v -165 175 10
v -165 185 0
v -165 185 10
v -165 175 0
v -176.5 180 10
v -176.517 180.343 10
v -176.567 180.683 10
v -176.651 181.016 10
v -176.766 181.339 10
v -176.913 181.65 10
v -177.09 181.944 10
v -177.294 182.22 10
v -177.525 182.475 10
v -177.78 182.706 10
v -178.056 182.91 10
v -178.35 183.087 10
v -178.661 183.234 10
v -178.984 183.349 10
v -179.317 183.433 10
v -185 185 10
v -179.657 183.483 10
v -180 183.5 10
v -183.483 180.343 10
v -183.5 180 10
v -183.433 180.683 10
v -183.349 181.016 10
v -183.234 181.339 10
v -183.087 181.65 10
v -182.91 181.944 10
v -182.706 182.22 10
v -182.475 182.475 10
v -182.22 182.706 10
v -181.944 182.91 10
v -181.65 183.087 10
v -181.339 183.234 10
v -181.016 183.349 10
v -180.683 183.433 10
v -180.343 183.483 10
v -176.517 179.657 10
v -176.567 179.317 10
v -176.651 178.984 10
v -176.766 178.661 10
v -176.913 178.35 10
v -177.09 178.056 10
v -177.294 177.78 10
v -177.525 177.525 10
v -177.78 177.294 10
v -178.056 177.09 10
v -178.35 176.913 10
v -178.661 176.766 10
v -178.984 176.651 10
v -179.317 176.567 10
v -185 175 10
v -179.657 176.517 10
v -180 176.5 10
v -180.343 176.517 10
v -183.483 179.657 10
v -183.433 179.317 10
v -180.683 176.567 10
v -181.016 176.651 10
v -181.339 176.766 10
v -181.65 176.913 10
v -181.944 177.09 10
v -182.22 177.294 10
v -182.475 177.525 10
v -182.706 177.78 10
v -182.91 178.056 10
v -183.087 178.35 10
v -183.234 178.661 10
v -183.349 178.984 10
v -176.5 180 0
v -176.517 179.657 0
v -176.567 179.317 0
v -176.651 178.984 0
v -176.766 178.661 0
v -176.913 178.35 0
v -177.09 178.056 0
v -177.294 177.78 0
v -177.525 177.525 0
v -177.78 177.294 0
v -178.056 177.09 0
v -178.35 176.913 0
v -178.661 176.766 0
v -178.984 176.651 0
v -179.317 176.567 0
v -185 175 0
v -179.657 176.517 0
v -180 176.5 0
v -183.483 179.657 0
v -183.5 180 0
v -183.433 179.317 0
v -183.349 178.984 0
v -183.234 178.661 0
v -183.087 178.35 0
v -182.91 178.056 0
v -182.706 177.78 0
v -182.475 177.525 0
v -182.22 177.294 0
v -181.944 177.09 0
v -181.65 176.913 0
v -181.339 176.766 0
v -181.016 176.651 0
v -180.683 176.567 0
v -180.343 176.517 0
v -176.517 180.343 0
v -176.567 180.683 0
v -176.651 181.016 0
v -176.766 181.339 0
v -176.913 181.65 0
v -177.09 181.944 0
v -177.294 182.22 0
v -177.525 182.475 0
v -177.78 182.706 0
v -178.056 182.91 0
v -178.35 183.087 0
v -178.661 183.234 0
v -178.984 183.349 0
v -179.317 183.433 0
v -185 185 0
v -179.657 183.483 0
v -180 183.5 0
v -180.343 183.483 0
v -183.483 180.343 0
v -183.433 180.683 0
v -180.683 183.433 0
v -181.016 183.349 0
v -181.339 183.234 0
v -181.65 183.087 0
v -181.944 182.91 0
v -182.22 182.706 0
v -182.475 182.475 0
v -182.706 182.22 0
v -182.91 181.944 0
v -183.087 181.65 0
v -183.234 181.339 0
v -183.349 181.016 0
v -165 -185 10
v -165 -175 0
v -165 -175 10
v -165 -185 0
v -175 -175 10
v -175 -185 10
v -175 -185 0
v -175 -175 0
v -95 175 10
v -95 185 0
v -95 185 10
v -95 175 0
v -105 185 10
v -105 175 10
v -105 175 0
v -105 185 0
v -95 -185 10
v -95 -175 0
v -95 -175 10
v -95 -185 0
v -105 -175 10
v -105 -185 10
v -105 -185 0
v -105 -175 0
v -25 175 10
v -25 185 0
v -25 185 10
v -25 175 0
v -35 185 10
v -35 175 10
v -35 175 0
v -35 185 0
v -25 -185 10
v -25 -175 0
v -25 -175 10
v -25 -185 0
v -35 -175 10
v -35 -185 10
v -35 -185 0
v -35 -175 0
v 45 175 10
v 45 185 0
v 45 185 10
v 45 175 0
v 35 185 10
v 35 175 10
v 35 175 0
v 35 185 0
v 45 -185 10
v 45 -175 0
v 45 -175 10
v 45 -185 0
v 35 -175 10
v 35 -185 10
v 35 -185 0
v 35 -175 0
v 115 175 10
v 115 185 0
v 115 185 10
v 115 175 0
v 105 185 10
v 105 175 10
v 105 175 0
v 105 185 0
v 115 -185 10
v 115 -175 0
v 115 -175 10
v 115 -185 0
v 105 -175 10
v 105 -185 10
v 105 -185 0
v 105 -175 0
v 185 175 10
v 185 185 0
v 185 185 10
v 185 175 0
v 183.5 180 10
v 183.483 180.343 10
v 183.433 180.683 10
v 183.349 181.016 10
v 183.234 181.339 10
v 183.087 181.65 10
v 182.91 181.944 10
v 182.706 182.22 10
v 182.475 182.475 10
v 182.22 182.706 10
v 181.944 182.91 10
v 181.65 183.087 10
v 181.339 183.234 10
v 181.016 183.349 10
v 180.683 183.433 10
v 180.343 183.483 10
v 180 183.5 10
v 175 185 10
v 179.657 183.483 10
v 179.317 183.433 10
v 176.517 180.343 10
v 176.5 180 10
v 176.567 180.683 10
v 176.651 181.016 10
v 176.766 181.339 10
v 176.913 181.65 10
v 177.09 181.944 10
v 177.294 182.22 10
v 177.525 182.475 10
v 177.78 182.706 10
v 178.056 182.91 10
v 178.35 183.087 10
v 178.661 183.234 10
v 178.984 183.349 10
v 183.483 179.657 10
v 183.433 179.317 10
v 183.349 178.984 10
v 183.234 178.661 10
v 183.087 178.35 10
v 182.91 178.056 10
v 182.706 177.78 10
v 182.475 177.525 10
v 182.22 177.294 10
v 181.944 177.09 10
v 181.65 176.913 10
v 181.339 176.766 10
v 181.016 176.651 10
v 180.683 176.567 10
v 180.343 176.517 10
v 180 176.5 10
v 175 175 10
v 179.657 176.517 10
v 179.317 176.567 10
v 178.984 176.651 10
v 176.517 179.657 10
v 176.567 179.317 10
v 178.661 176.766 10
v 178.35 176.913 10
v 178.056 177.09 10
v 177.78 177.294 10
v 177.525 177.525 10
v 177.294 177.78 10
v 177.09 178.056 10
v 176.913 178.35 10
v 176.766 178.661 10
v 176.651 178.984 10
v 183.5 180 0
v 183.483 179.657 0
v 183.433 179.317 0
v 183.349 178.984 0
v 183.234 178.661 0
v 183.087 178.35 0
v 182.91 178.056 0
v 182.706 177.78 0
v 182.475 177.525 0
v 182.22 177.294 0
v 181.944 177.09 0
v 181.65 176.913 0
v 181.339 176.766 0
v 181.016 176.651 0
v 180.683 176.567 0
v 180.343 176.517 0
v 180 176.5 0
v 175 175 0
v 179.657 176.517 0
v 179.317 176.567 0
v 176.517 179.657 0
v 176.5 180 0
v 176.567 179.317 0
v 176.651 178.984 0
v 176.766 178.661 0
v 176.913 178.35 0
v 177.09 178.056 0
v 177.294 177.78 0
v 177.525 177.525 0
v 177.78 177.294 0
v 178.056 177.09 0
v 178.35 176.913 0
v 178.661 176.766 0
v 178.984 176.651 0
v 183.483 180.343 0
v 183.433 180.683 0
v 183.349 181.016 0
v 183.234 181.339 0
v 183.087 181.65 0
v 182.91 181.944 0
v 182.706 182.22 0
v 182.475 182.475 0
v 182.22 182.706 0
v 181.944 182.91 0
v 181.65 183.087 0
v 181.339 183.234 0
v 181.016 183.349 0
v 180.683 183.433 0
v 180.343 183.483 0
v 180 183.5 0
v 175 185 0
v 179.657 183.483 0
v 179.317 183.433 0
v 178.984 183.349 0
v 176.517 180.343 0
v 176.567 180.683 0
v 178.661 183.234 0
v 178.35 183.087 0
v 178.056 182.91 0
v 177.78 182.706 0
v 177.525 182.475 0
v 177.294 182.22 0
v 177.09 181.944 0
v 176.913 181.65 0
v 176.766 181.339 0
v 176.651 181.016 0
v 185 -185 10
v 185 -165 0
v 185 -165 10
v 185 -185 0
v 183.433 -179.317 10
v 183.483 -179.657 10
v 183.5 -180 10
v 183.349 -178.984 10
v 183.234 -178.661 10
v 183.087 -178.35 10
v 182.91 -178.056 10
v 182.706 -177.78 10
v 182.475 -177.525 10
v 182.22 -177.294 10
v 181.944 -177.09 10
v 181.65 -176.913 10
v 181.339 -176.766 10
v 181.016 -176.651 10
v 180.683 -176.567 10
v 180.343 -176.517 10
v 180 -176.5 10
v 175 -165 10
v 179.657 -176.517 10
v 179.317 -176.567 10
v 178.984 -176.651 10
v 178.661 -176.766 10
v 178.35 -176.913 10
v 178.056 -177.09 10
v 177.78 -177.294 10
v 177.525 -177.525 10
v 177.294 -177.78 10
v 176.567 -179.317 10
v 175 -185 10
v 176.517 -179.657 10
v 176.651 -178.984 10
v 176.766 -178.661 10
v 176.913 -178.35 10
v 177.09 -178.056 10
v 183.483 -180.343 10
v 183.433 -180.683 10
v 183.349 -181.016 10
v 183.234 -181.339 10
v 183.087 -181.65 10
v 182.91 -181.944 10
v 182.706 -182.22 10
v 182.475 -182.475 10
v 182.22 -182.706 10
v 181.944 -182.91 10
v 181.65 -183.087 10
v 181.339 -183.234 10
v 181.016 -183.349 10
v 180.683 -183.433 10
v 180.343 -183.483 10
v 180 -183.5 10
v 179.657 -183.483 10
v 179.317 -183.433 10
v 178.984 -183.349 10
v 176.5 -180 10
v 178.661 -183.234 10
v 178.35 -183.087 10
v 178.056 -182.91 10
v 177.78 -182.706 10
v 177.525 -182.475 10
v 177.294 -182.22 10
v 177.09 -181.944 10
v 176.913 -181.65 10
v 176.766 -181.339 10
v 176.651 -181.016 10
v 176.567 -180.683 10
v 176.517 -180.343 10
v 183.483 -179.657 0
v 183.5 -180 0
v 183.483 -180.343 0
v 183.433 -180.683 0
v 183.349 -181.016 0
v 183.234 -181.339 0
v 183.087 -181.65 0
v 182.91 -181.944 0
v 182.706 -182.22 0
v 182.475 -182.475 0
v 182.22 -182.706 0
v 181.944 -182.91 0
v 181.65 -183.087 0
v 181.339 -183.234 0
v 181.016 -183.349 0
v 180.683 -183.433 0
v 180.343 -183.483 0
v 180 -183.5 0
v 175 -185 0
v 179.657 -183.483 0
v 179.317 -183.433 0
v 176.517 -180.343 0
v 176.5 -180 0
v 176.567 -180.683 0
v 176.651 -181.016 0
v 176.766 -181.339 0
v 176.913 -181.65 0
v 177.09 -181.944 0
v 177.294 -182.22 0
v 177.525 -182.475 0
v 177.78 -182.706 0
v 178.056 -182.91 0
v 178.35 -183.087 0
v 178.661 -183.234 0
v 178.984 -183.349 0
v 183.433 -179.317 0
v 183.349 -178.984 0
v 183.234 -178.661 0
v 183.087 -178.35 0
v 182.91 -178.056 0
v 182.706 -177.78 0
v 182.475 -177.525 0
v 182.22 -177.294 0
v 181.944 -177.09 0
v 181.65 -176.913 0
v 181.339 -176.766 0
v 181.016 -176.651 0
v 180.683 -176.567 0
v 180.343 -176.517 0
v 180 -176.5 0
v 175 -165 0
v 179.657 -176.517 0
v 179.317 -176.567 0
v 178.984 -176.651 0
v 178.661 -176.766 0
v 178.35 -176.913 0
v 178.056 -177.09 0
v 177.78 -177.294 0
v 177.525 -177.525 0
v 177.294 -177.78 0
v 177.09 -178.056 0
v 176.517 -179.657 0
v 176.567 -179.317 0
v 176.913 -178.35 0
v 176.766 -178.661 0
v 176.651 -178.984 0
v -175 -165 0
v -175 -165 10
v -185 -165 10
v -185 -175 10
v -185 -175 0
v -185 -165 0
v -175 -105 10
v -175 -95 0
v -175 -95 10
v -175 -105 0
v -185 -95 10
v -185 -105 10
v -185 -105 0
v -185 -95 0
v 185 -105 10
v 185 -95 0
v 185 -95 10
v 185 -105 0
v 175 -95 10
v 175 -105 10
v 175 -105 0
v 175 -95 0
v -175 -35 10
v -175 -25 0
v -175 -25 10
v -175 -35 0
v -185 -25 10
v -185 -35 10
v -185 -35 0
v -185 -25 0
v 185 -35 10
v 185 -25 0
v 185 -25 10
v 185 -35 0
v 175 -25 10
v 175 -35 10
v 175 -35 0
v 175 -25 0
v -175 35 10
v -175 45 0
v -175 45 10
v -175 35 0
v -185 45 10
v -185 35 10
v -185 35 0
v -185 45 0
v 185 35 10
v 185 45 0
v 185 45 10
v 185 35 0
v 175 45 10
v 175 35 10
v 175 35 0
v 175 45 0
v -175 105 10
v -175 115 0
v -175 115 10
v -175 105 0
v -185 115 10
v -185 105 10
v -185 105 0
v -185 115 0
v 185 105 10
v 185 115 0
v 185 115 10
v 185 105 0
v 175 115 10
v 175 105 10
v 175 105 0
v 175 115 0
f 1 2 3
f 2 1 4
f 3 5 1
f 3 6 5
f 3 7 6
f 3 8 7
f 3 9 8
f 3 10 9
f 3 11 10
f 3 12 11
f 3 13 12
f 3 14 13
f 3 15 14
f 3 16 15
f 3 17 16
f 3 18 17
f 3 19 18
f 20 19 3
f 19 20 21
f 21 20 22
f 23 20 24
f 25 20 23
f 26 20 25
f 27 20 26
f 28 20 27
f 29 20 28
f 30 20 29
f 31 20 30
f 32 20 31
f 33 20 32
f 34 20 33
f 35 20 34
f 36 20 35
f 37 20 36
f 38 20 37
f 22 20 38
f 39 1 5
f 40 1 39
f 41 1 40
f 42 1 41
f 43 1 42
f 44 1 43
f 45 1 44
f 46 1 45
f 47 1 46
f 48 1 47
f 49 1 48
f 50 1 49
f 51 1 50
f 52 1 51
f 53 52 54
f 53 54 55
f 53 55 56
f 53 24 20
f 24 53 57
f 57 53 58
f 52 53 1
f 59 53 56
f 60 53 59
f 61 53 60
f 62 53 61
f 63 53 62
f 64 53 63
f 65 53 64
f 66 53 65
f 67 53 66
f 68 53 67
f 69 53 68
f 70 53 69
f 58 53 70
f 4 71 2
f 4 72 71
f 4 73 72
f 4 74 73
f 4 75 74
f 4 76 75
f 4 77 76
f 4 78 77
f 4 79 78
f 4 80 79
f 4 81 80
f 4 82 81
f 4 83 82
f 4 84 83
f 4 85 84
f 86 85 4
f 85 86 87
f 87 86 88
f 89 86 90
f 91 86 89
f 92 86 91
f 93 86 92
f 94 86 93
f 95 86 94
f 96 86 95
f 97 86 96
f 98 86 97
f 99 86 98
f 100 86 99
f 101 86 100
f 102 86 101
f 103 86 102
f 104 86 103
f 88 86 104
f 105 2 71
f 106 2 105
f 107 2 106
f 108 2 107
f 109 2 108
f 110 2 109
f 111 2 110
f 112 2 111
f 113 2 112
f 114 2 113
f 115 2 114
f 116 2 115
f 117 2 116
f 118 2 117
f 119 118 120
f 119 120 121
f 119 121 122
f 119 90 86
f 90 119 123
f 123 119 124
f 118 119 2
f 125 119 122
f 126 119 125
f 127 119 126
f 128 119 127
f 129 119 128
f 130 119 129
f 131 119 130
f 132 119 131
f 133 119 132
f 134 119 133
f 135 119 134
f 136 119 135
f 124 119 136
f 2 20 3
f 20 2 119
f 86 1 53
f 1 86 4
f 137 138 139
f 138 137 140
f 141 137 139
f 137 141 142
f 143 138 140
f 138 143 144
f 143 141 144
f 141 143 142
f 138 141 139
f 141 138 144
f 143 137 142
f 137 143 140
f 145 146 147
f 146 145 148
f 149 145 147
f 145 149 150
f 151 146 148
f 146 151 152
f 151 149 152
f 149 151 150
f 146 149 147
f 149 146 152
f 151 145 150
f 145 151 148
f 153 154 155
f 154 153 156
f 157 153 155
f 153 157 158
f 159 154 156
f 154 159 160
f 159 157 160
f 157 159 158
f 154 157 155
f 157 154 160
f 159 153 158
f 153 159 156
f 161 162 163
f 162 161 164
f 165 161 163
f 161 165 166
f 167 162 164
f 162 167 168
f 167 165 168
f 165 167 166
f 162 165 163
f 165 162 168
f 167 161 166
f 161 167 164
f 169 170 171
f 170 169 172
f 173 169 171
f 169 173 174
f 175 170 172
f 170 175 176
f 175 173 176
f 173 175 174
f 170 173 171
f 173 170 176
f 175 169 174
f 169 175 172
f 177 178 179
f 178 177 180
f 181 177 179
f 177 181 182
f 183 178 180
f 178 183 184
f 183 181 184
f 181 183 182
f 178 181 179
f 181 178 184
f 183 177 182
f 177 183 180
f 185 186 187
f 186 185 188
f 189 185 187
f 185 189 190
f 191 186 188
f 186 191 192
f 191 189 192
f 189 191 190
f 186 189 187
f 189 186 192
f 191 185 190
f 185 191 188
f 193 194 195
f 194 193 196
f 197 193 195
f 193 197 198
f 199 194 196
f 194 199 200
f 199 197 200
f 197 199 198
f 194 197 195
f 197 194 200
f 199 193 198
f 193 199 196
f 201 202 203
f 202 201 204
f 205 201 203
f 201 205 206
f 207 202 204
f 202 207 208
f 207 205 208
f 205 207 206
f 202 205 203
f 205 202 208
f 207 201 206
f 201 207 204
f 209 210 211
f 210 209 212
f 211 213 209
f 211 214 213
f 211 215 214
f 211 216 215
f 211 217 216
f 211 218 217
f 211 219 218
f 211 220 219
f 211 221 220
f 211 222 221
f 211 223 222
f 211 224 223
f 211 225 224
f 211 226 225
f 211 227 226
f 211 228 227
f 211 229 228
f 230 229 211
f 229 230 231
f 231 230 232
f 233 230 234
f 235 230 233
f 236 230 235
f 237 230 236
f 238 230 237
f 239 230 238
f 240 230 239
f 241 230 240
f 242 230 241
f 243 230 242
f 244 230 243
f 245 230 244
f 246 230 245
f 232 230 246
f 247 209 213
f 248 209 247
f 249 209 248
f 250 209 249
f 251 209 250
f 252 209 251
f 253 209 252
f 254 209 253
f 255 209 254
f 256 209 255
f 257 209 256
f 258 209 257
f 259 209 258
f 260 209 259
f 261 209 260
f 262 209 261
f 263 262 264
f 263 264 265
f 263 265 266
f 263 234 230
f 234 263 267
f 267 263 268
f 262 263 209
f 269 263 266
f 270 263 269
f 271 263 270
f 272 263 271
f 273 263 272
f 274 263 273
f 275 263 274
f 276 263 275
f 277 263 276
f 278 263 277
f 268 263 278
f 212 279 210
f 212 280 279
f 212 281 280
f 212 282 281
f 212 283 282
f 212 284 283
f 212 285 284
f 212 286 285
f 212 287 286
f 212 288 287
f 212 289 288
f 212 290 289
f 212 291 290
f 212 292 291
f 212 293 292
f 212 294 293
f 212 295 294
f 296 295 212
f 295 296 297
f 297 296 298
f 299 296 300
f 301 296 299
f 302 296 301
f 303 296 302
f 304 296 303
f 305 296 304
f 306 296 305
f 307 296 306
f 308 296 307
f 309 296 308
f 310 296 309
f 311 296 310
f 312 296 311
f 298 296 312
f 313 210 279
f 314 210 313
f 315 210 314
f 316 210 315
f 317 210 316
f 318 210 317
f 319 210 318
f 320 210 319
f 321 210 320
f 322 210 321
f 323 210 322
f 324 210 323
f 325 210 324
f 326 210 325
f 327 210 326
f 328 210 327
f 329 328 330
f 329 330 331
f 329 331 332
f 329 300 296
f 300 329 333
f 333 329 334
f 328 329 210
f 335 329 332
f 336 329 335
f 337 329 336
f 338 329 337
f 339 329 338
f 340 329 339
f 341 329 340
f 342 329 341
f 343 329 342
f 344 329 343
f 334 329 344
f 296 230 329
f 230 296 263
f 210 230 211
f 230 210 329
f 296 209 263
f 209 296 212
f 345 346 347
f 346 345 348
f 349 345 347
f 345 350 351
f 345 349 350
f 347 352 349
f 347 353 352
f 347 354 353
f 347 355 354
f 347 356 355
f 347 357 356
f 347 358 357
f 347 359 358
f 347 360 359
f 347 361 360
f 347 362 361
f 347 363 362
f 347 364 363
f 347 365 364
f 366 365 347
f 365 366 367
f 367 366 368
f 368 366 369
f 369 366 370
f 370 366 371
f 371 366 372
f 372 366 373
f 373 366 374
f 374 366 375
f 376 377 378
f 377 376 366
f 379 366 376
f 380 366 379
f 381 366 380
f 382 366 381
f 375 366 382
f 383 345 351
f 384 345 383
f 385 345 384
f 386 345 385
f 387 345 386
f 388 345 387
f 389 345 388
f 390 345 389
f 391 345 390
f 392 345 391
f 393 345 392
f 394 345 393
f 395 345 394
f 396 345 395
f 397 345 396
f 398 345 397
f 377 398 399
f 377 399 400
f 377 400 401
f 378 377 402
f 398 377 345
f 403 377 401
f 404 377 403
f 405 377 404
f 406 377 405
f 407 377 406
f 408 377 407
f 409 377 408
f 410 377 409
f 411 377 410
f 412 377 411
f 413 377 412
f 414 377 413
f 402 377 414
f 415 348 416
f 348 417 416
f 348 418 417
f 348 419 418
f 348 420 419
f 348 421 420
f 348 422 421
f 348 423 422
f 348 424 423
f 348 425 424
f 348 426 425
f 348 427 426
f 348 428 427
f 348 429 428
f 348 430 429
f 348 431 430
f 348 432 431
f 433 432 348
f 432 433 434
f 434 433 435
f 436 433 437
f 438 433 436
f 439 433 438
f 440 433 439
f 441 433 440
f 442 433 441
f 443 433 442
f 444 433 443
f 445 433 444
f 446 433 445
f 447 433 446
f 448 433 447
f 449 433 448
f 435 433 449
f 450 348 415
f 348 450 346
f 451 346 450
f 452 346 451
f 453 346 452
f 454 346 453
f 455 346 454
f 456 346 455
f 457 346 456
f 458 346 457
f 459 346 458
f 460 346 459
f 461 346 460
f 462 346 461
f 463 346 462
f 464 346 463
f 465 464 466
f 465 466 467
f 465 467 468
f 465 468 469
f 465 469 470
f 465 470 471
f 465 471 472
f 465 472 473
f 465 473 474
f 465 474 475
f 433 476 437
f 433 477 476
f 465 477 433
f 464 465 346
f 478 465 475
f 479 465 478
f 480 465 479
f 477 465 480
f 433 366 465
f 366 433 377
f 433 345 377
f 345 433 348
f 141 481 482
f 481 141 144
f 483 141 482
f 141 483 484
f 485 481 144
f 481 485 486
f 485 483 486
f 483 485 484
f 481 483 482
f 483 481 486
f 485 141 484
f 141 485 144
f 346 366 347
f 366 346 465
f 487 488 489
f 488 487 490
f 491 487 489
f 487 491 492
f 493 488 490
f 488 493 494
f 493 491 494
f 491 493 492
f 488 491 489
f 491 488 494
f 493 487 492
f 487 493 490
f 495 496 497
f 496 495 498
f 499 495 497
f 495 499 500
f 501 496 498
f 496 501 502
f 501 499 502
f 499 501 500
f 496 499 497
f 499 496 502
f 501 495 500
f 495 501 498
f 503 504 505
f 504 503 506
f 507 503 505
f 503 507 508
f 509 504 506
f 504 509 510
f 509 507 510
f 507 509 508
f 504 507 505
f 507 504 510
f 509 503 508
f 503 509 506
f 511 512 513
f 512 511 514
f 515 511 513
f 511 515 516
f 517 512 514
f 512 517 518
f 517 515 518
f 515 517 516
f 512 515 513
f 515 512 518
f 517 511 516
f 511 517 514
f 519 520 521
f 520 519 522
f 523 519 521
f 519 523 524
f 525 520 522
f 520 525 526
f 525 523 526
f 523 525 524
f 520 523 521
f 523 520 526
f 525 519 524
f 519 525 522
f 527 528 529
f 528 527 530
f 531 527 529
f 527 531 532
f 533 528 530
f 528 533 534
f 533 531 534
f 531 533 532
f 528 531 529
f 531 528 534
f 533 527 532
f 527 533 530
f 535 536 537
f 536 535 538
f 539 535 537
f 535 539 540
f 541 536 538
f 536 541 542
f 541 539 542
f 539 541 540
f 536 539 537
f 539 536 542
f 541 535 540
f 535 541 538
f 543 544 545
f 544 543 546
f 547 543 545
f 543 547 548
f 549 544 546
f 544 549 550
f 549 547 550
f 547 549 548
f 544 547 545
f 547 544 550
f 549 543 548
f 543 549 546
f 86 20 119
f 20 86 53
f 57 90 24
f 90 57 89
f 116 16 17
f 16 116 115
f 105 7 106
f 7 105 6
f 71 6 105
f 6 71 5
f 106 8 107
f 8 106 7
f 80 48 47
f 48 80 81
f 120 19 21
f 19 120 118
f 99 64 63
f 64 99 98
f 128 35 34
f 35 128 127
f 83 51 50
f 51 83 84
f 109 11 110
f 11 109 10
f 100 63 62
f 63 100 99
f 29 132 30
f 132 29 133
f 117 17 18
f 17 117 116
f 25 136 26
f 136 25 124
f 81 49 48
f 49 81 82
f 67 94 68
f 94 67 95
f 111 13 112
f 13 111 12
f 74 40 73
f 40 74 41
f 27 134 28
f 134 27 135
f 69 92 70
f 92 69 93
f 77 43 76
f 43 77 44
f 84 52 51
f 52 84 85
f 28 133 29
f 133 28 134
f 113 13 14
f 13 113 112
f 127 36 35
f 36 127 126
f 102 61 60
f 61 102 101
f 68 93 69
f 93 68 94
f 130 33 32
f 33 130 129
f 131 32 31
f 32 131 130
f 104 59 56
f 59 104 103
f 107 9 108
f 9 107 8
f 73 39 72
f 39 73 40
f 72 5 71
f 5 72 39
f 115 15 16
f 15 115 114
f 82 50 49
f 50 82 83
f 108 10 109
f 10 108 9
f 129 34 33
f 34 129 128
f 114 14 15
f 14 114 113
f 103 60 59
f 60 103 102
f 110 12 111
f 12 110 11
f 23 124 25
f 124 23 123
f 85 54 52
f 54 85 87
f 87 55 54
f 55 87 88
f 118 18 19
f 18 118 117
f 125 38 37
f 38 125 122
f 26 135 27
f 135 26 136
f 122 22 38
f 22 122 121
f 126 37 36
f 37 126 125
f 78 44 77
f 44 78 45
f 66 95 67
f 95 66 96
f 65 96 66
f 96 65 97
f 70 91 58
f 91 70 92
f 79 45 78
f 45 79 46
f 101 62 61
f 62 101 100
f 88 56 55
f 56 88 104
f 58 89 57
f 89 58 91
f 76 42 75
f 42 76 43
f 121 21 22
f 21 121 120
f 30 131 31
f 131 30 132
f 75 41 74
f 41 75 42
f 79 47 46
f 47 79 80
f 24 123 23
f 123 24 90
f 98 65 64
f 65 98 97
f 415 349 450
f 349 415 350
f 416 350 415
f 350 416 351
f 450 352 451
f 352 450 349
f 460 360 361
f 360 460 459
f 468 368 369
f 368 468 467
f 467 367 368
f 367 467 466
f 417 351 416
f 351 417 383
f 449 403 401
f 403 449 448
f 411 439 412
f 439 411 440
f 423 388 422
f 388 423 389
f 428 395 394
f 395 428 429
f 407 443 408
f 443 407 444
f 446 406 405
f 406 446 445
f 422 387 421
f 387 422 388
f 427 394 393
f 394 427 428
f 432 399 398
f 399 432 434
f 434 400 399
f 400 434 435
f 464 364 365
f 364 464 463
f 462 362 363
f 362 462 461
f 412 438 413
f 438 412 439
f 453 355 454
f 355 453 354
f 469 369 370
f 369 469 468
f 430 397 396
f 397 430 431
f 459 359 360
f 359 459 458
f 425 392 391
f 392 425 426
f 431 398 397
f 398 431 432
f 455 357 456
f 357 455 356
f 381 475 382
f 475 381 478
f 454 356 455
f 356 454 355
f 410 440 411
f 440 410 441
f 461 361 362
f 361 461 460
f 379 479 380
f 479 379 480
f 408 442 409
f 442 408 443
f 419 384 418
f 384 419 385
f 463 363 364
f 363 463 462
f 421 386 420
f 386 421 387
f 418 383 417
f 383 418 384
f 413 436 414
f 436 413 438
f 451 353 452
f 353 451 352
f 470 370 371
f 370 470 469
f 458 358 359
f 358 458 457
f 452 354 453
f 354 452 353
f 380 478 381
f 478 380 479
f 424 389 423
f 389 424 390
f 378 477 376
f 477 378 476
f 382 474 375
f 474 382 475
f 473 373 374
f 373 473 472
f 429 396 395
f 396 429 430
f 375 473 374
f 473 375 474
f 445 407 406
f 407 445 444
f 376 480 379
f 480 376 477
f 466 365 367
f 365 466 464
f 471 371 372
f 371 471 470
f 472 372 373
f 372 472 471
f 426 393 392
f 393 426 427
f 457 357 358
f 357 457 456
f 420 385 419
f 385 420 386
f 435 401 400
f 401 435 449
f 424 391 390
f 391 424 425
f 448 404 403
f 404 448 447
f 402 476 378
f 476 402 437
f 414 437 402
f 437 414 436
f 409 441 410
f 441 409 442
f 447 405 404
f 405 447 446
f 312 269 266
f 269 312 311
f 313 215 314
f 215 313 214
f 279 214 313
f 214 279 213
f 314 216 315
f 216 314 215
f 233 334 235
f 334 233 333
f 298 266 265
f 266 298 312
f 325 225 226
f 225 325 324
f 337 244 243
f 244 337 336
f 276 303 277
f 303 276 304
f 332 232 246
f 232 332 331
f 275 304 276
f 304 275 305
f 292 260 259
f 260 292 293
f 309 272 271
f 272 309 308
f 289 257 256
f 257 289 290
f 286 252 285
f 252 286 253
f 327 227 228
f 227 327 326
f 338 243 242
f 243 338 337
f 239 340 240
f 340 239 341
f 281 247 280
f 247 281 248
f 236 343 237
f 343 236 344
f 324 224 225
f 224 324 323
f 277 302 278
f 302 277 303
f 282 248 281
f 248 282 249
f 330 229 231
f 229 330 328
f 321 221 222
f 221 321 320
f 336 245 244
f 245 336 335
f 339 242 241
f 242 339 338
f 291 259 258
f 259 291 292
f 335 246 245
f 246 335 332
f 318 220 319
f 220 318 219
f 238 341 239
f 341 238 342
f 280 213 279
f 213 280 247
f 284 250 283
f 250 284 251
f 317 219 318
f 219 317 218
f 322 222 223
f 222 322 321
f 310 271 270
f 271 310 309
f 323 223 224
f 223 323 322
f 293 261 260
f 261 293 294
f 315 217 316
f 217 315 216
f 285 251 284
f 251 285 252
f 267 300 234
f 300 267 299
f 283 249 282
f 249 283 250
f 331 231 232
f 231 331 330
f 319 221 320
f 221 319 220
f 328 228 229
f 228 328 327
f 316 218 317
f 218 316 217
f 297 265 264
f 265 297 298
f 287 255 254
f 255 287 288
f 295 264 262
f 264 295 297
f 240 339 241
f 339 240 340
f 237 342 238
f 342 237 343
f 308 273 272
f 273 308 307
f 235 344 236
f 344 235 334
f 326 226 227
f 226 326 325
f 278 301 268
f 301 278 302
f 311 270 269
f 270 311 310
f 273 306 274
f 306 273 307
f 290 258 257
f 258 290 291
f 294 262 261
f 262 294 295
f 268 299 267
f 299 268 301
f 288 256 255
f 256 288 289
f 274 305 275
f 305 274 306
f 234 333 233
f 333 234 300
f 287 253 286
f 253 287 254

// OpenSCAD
// ring_39.scad - ring index 39 (z bottom = 390 mm)
$fn = 64; bar = 10; half_b = bar/2; outer = 370; half_outer = outer/2;
front_y = 180; back_y = -180; left_x = -180; right_x = 180;
x_centers = [-170, -100, -30, 40, 110, 180];
z_centers = [5, 85, 155, 225, 295, 365, 435, 505, 575, 645, 715]; ring_z = 390;
module place_box(cx, cy, sx, sy) { translate([cx - sx/2, cy - sy/2, 0]) cube([sx, sy, bar]); }

difference() { union() {
    for (x = x_centers) { place_box(x, front_y, bar, bar); place_box(x, back_y, bar, bar); }
    for (y = x_centers) { place_box(left_x, y, bar, bar); place_box(right_x, y, bar, bar); }
    for (zc = z_centers) if ((zc - half_b < ring_z + bar) && (zc + half_b > ring_z)) {
        translate([-half_outer, front_y - half_b, 0]) cube([outer, bar, bar]);
        translate([-half_outer, back_y - half_b, 0])  cube([outer, bar, bar]);
        translate([left_x - half_b, -half_outer, 0])  cube([bar, outer, bar]);
        translate([right_x - half_b, -half_outer, 0]) cube([bar, outer, bar]);
    }
  }
  for (cx = [-180, 180]) for (cy = [-180, 180]) translate([cx, cy, 0]) cylinder(h = bar, r = 3.5, $fn = 64);
}
